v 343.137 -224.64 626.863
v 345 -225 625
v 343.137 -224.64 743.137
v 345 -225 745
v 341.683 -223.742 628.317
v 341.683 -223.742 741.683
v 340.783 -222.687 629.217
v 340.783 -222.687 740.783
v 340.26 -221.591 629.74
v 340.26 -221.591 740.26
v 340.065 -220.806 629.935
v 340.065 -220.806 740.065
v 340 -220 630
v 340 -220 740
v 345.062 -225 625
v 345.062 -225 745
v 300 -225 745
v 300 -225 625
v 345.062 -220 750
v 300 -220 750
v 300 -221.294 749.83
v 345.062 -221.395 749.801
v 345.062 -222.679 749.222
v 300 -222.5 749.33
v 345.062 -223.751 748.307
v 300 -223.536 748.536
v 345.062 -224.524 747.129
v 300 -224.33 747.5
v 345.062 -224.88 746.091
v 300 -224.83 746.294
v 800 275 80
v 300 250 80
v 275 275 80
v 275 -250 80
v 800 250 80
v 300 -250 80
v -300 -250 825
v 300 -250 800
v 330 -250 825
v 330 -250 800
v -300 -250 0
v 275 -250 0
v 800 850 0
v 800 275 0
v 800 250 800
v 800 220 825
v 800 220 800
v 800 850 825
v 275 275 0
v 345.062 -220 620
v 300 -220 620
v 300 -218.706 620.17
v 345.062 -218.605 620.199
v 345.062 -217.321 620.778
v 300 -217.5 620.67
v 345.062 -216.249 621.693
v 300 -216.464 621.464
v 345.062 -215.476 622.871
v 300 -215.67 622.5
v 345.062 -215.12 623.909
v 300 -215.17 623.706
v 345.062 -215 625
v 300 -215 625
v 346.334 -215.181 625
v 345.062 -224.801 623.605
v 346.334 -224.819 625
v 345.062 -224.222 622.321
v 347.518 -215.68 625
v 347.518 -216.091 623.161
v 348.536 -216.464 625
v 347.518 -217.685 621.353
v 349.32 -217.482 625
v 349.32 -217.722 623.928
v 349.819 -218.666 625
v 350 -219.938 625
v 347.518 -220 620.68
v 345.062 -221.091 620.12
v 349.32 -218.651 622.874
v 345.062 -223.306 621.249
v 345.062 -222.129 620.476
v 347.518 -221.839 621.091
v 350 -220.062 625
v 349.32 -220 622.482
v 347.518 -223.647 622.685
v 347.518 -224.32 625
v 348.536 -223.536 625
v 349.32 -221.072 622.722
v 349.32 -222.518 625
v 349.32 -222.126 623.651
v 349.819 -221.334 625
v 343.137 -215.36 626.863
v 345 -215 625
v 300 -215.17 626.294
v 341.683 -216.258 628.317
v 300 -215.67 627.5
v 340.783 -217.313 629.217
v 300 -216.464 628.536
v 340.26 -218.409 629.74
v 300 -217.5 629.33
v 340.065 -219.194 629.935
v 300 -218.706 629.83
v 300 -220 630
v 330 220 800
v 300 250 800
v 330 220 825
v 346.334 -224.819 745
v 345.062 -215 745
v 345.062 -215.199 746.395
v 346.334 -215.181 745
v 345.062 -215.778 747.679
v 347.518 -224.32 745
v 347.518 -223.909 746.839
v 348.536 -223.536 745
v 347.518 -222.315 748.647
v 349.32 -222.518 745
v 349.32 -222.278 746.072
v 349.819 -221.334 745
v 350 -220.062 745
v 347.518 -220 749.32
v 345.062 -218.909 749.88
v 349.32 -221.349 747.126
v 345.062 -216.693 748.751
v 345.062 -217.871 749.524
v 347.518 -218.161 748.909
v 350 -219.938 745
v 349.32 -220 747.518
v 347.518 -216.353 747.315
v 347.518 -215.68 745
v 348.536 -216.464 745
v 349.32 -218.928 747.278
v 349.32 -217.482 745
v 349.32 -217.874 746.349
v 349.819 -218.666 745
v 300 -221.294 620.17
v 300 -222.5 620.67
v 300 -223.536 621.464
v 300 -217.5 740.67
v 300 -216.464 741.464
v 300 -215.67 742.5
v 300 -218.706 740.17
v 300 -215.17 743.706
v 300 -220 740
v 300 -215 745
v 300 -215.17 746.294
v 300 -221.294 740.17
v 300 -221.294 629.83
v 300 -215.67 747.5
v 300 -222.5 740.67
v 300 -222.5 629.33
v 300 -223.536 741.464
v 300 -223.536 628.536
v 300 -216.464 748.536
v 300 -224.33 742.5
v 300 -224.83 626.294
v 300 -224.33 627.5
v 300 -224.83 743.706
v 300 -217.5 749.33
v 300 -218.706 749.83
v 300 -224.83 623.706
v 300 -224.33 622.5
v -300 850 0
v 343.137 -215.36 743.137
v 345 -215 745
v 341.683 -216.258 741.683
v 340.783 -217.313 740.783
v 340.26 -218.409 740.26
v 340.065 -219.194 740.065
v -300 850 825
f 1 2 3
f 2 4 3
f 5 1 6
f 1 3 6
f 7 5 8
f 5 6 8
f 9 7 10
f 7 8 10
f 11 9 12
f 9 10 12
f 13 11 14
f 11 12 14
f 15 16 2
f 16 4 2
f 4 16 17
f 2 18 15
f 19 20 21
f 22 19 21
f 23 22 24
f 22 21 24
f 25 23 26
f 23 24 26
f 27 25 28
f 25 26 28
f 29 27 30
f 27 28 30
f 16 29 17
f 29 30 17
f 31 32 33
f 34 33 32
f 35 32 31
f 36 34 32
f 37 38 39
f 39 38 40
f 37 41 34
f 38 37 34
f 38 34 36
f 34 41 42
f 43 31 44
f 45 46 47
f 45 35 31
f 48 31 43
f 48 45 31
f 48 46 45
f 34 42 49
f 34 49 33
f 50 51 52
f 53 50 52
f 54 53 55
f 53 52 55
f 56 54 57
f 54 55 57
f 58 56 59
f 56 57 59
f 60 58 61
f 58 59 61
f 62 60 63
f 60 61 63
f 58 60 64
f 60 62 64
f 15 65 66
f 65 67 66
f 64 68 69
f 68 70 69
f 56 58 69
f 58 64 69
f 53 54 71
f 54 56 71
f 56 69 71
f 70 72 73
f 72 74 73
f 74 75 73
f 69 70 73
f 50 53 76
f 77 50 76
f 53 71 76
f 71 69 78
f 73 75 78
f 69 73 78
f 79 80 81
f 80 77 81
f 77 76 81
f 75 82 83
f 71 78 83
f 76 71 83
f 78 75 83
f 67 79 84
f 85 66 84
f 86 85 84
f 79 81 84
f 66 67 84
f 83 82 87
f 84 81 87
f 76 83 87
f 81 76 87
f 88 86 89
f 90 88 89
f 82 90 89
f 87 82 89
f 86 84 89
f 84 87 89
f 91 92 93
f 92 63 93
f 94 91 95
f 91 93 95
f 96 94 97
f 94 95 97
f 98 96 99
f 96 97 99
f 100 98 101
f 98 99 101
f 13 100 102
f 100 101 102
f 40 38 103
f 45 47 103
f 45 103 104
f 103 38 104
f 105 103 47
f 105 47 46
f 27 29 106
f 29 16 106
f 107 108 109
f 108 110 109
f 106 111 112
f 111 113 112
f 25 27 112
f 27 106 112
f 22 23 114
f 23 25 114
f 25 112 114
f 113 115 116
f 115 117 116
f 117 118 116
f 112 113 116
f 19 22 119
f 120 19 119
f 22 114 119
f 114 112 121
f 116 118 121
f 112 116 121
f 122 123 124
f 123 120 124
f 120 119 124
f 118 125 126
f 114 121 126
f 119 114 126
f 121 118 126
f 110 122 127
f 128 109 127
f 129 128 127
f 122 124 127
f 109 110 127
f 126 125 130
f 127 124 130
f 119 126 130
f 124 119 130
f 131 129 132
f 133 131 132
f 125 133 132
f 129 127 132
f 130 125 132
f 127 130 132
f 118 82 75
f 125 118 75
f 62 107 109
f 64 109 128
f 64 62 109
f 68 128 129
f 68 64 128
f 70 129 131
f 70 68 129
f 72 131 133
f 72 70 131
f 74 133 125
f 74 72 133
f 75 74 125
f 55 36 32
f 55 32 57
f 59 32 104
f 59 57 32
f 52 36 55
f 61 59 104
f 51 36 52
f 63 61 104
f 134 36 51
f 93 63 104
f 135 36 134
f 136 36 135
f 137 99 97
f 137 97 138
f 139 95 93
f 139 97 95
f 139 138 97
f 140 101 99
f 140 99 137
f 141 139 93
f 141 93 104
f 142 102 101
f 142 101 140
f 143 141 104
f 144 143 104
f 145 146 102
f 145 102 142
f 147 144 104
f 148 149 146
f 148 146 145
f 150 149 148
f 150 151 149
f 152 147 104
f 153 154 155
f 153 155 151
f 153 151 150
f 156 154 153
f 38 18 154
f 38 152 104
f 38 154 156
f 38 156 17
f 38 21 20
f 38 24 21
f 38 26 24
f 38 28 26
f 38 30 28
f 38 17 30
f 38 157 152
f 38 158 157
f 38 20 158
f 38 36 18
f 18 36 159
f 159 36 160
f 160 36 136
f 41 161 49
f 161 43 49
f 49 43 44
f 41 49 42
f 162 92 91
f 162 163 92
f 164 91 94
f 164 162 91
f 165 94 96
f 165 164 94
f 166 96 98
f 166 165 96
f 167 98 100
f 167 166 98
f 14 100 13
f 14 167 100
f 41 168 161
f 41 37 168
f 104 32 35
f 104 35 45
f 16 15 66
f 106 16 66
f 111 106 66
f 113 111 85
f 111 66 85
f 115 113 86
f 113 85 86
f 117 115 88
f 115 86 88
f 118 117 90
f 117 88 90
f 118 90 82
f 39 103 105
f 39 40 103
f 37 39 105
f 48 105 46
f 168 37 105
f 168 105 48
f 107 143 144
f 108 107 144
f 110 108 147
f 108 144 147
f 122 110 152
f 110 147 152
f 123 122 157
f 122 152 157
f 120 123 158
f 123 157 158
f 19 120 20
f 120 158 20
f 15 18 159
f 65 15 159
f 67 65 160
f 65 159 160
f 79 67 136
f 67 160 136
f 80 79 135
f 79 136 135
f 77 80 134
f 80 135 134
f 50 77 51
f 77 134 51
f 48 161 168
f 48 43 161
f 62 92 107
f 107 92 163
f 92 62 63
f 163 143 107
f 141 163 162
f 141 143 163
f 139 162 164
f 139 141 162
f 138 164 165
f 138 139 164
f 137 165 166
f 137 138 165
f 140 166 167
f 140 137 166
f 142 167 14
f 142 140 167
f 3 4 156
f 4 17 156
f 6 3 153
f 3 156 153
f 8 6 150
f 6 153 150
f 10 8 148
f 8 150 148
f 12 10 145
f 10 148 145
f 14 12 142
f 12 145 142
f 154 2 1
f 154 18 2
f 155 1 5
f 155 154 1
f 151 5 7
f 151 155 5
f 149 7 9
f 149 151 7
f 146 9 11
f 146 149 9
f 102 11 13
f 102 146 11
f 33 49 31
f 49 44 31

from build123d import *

# Parameters (mm, degrees)
F0_W        = 600
F0_H        = 500
F1_DEPTH    = 800
F2_W        = 500
F2_H        = 80
F3_DEPTH    = 25
F5_DEPTH    = 50
F6_T1_DEPTH = 145.0048285071
F6_T4_ANGLE = 180
F6_T6_ANGLE = 180
F7_W        = 40
F7_H        = 110
F8_DEPTH    = 25
F9_R        = 4.99999
F10_W       = 630
F10_H       = 500
F11_DEPTH   = 25
F12_DEPTH   = 600
F13_W       = 600
F13_H       = 800
F14_DEPTH   = 500
F15_W       = 630
F15_H       = 25
F16_DEPTH   = 470
F17_W       = 500
F17_H       = 80
F18_DEPTH   = 25
F19_W       = 575
F19_H       = 80
F20_DEPTH   = 25


# Not quite as in the source:
# - a fillet or chamfer that OpenCascade refuses, or shapes differently, is made with other operations: its cross-section is extruded or revolved along the edge and cut away or added
# - a fillet or chamfer is up to 0.001 mm smaller than in the source, because OpenCascade refuses the exact size


with BuildPart() as f1:
    # F0 (on Top) → F1 (new body)
    with BuildSketch(Plane.XY):
        Rectangle(F0_W, F0_H)
    extrude(amount=F1_DEPTH)

    # F2 (on face) → F3 (cut)
    with BuildSketch(Plane.YZ.offset(300)):
        with Locations((0, 40)):
            Rectangle(F2_W, F2_H)
    extrude(amount=-F3_DEPTH, mode=Mode.SUBTRACT)

    # F4 (on face) → F5 (join)
    with BuildSketch(Plane.YZ.offset(300)):
        with BuildLine():
            ThreePointArc((-220, 750), (-223.5355339059, 748.5355339059), (-225, 745))
            Line((-225, 745), (-225, 625))
            ThreePointArc((-225, 625), (-223.5355339059, 621.4644660941), (-220, 620))
            ThreePointArc((-220, 620), (-216.4644660941, 621.4644660941), (-215, 625))
            Line((-215, 625), (-215, 745))
            ThreePointArc((-215, 745), (-216.4644660941, 748.5355339059), (-220, 750))
        make_face()
    extrude(amount=F5_DEPTH)

    # F6: fillet of radius 5 on 4 edges, made by hand

    # F6_s2 → F6_t1 (cut)
    with BuildSketch(Plane.XY.offset(612.4975857464)):
        with BuildLine():
            ThreePointArc((344.9990343146, -225.0004), (348.5355339059, -223.5355339059), (350.0004, -219.9990343146))
            Line((350.0004, -219.9990343146), (350.5005365685, -219.9990343146))
            ThreePointArc((350.5005365685, -219.9990343146), (350.5001365685, -222.4995171573), (350.5001365685, -225))
            Line((350.5001365685, -225), (350, -225.5001365685))
            ThreePointArc((350, -225.5001365685), (347.4995171573, -225.5001365685), (344.9990343146, -225.5005365685))
            Line((344.9990343146, -225.5005365685), (344.9990343146, -225.0004))
        make_face()
        with BuildLine():
            ThreePointArc((344.9990343146, -214.9996), (348.5355339059, -216.4644660941), (350.0004, -220.0009656854))
            Line((350.0004, -220.0009656854), (350.5005365685, -220.0009656854))
            ThreePointArc((350.5005365685, -220.0009656854), (350.5001365685, -217.5004828427), (350.5001365685, -215))
            Line((350.5001365685, -215), (350, -214.4998634315))
            ThreePointArc((350, -214.4998634315), (347.4995171573, -214.4998634315), (344.9990343146, -214.4994634315))
            Line((344.9990343146, -214.4994634315), (344.9990343146, -214.9996))
        make_face()
    extrude(amount=F6_T1_DEPTH, mode=Mode.SUBTRACT)

    # F6_s3 → F6_t4 (revolve, cut)
    with BuildSketch(Plane.XY.offset(745)):
        with BuildLine():
            ThreePointArc((344.9990343146, -225.0004), (348.5351924681, -223.5358753108), (350.0003999068, -220))
            Line((350.0003999068, -220), (350.5005364913, -220))
            Line((350.5005364913, -220), (350.5001365685, -225))
            Line((350.5001365685, -225), (350, -225.5001365685))
            ThreePointArc((350, -225.5001365685), (347.4995171573, -225.5001365685), (344.9990343146, -225.5005365685))
            Line((344.9990343146, -225.5005365685), (344.9990343146, -225.0004))
        make_face()
    revolve(axis=Axis((350, -220, 745), (-1, 0, 0)), revolution_arc=F6_T4_ANGLE, mode=Mode.SUBTRACT)

    # F6_s5 → F6_t6 (revolve, cut)
    with BuildSketch(Plane.XY.offset(625)):
        with BuildLine():
            ThreePointArc((344.9990343146, -214.9996), (348.5351924681, -216.4641246892), (350.0003999068, -220))
            Line((350.0003999068, -220), (350.5005364913, -220))
            Line((350.5005364913, -220), (350.5001365685, -215))
            Line((350.5001365685, -215), (350, -214.4998634315))
            ThreePointArc((350, -214.4998634315), (347.4995171573, -214.4998634315), (344.9990343146, -214.4994634315))
            Line((344.9990343146, -214.4994634315), (344.9990343146, -214.9996))
        make_face()
    revolve(axis=Axis((350, -220, 625), (-1, 0, 0)), revolution_arc=F6_T6_ANGLE, mode=Mode.SUBTRACT)

    # F7 (on face) → F8 (cut)
    with BuildSketch(Plane(origin=(0, -215, 0), x_dir=(-1, 0, 0), z_dir=(0, 1, 0))):
        with Locations((-320, 685)):
            Rectangle(F7_W, F7_H)
    extrude(amount=-F8_DEPTH, mode=Mode.SUBTRACT)

    # F9 (radius 5 in the source; OpenCascade refuses exactly that, so slightly less here)
    f9_edges = [f1.edges().sort_by_distance(p)[0] for p in [
        (320, -215, 740),
        (340, -215, 685),
        (320, -215, 630),
        (320, -225, 740),
        (340, -225, 685),
        (320, -225, 630),
    ]]
    fillet(f9_edges, radius=F9_R)

    # F10 (on face) → F11 (join)
    with BuildSketch(Plane.XY.offset(800)):
        with Locations((15, 0)):
            Rectangle(F10_W, F10_H)
    extrude(amount=F11_DEPTH)

    # F12 (add): a face of the model
    f12_faces = [f1.faces().sort_by_distance(p)[0] for p in [
        (-0.6860759494, 250, 414.6164556962),
    ]]
    extrude(f12_faces, amount=F12_DEPTH)

    # F13 (on face) → F14 (join)
    with BuildSketch(Plane.YZ.offset(300)):
        with Locations((550, 400)):
            Rectangle(F13_W, F13_H)
    extrude(amount=F14_DEPTH)

    # F15 (on face) → F16 (join)
    with BuildSketch(Plane.YZ.offset(330)):
        with Locations((535, 812.5)):
            Rectangle(F15_W, F15_H)
    extrude(amount=F16_DEPTH)

    # F17 (on face) → F18 (cut)
    with BuildSketch(Plane.XZ.offset(-250)):
        with Locations((550, 40)):
            Rectangle(F17_W, F17_H)
    extrude(amount=-F18_DEPTH, mode=Mode.SUBTRACT)

    # F19 (on face) → F20 (join)
    with BuildSketch(Plane(origin=(300, 0, 0), x_dir=(0, -1, 0), z_dir=(-1, 0, 0))):
        with Locations((-562.5, 40)):
            Rectangle(F19_W, F19_H)
    extrude(amount=F20_DEPTH)


solid = f1.part
